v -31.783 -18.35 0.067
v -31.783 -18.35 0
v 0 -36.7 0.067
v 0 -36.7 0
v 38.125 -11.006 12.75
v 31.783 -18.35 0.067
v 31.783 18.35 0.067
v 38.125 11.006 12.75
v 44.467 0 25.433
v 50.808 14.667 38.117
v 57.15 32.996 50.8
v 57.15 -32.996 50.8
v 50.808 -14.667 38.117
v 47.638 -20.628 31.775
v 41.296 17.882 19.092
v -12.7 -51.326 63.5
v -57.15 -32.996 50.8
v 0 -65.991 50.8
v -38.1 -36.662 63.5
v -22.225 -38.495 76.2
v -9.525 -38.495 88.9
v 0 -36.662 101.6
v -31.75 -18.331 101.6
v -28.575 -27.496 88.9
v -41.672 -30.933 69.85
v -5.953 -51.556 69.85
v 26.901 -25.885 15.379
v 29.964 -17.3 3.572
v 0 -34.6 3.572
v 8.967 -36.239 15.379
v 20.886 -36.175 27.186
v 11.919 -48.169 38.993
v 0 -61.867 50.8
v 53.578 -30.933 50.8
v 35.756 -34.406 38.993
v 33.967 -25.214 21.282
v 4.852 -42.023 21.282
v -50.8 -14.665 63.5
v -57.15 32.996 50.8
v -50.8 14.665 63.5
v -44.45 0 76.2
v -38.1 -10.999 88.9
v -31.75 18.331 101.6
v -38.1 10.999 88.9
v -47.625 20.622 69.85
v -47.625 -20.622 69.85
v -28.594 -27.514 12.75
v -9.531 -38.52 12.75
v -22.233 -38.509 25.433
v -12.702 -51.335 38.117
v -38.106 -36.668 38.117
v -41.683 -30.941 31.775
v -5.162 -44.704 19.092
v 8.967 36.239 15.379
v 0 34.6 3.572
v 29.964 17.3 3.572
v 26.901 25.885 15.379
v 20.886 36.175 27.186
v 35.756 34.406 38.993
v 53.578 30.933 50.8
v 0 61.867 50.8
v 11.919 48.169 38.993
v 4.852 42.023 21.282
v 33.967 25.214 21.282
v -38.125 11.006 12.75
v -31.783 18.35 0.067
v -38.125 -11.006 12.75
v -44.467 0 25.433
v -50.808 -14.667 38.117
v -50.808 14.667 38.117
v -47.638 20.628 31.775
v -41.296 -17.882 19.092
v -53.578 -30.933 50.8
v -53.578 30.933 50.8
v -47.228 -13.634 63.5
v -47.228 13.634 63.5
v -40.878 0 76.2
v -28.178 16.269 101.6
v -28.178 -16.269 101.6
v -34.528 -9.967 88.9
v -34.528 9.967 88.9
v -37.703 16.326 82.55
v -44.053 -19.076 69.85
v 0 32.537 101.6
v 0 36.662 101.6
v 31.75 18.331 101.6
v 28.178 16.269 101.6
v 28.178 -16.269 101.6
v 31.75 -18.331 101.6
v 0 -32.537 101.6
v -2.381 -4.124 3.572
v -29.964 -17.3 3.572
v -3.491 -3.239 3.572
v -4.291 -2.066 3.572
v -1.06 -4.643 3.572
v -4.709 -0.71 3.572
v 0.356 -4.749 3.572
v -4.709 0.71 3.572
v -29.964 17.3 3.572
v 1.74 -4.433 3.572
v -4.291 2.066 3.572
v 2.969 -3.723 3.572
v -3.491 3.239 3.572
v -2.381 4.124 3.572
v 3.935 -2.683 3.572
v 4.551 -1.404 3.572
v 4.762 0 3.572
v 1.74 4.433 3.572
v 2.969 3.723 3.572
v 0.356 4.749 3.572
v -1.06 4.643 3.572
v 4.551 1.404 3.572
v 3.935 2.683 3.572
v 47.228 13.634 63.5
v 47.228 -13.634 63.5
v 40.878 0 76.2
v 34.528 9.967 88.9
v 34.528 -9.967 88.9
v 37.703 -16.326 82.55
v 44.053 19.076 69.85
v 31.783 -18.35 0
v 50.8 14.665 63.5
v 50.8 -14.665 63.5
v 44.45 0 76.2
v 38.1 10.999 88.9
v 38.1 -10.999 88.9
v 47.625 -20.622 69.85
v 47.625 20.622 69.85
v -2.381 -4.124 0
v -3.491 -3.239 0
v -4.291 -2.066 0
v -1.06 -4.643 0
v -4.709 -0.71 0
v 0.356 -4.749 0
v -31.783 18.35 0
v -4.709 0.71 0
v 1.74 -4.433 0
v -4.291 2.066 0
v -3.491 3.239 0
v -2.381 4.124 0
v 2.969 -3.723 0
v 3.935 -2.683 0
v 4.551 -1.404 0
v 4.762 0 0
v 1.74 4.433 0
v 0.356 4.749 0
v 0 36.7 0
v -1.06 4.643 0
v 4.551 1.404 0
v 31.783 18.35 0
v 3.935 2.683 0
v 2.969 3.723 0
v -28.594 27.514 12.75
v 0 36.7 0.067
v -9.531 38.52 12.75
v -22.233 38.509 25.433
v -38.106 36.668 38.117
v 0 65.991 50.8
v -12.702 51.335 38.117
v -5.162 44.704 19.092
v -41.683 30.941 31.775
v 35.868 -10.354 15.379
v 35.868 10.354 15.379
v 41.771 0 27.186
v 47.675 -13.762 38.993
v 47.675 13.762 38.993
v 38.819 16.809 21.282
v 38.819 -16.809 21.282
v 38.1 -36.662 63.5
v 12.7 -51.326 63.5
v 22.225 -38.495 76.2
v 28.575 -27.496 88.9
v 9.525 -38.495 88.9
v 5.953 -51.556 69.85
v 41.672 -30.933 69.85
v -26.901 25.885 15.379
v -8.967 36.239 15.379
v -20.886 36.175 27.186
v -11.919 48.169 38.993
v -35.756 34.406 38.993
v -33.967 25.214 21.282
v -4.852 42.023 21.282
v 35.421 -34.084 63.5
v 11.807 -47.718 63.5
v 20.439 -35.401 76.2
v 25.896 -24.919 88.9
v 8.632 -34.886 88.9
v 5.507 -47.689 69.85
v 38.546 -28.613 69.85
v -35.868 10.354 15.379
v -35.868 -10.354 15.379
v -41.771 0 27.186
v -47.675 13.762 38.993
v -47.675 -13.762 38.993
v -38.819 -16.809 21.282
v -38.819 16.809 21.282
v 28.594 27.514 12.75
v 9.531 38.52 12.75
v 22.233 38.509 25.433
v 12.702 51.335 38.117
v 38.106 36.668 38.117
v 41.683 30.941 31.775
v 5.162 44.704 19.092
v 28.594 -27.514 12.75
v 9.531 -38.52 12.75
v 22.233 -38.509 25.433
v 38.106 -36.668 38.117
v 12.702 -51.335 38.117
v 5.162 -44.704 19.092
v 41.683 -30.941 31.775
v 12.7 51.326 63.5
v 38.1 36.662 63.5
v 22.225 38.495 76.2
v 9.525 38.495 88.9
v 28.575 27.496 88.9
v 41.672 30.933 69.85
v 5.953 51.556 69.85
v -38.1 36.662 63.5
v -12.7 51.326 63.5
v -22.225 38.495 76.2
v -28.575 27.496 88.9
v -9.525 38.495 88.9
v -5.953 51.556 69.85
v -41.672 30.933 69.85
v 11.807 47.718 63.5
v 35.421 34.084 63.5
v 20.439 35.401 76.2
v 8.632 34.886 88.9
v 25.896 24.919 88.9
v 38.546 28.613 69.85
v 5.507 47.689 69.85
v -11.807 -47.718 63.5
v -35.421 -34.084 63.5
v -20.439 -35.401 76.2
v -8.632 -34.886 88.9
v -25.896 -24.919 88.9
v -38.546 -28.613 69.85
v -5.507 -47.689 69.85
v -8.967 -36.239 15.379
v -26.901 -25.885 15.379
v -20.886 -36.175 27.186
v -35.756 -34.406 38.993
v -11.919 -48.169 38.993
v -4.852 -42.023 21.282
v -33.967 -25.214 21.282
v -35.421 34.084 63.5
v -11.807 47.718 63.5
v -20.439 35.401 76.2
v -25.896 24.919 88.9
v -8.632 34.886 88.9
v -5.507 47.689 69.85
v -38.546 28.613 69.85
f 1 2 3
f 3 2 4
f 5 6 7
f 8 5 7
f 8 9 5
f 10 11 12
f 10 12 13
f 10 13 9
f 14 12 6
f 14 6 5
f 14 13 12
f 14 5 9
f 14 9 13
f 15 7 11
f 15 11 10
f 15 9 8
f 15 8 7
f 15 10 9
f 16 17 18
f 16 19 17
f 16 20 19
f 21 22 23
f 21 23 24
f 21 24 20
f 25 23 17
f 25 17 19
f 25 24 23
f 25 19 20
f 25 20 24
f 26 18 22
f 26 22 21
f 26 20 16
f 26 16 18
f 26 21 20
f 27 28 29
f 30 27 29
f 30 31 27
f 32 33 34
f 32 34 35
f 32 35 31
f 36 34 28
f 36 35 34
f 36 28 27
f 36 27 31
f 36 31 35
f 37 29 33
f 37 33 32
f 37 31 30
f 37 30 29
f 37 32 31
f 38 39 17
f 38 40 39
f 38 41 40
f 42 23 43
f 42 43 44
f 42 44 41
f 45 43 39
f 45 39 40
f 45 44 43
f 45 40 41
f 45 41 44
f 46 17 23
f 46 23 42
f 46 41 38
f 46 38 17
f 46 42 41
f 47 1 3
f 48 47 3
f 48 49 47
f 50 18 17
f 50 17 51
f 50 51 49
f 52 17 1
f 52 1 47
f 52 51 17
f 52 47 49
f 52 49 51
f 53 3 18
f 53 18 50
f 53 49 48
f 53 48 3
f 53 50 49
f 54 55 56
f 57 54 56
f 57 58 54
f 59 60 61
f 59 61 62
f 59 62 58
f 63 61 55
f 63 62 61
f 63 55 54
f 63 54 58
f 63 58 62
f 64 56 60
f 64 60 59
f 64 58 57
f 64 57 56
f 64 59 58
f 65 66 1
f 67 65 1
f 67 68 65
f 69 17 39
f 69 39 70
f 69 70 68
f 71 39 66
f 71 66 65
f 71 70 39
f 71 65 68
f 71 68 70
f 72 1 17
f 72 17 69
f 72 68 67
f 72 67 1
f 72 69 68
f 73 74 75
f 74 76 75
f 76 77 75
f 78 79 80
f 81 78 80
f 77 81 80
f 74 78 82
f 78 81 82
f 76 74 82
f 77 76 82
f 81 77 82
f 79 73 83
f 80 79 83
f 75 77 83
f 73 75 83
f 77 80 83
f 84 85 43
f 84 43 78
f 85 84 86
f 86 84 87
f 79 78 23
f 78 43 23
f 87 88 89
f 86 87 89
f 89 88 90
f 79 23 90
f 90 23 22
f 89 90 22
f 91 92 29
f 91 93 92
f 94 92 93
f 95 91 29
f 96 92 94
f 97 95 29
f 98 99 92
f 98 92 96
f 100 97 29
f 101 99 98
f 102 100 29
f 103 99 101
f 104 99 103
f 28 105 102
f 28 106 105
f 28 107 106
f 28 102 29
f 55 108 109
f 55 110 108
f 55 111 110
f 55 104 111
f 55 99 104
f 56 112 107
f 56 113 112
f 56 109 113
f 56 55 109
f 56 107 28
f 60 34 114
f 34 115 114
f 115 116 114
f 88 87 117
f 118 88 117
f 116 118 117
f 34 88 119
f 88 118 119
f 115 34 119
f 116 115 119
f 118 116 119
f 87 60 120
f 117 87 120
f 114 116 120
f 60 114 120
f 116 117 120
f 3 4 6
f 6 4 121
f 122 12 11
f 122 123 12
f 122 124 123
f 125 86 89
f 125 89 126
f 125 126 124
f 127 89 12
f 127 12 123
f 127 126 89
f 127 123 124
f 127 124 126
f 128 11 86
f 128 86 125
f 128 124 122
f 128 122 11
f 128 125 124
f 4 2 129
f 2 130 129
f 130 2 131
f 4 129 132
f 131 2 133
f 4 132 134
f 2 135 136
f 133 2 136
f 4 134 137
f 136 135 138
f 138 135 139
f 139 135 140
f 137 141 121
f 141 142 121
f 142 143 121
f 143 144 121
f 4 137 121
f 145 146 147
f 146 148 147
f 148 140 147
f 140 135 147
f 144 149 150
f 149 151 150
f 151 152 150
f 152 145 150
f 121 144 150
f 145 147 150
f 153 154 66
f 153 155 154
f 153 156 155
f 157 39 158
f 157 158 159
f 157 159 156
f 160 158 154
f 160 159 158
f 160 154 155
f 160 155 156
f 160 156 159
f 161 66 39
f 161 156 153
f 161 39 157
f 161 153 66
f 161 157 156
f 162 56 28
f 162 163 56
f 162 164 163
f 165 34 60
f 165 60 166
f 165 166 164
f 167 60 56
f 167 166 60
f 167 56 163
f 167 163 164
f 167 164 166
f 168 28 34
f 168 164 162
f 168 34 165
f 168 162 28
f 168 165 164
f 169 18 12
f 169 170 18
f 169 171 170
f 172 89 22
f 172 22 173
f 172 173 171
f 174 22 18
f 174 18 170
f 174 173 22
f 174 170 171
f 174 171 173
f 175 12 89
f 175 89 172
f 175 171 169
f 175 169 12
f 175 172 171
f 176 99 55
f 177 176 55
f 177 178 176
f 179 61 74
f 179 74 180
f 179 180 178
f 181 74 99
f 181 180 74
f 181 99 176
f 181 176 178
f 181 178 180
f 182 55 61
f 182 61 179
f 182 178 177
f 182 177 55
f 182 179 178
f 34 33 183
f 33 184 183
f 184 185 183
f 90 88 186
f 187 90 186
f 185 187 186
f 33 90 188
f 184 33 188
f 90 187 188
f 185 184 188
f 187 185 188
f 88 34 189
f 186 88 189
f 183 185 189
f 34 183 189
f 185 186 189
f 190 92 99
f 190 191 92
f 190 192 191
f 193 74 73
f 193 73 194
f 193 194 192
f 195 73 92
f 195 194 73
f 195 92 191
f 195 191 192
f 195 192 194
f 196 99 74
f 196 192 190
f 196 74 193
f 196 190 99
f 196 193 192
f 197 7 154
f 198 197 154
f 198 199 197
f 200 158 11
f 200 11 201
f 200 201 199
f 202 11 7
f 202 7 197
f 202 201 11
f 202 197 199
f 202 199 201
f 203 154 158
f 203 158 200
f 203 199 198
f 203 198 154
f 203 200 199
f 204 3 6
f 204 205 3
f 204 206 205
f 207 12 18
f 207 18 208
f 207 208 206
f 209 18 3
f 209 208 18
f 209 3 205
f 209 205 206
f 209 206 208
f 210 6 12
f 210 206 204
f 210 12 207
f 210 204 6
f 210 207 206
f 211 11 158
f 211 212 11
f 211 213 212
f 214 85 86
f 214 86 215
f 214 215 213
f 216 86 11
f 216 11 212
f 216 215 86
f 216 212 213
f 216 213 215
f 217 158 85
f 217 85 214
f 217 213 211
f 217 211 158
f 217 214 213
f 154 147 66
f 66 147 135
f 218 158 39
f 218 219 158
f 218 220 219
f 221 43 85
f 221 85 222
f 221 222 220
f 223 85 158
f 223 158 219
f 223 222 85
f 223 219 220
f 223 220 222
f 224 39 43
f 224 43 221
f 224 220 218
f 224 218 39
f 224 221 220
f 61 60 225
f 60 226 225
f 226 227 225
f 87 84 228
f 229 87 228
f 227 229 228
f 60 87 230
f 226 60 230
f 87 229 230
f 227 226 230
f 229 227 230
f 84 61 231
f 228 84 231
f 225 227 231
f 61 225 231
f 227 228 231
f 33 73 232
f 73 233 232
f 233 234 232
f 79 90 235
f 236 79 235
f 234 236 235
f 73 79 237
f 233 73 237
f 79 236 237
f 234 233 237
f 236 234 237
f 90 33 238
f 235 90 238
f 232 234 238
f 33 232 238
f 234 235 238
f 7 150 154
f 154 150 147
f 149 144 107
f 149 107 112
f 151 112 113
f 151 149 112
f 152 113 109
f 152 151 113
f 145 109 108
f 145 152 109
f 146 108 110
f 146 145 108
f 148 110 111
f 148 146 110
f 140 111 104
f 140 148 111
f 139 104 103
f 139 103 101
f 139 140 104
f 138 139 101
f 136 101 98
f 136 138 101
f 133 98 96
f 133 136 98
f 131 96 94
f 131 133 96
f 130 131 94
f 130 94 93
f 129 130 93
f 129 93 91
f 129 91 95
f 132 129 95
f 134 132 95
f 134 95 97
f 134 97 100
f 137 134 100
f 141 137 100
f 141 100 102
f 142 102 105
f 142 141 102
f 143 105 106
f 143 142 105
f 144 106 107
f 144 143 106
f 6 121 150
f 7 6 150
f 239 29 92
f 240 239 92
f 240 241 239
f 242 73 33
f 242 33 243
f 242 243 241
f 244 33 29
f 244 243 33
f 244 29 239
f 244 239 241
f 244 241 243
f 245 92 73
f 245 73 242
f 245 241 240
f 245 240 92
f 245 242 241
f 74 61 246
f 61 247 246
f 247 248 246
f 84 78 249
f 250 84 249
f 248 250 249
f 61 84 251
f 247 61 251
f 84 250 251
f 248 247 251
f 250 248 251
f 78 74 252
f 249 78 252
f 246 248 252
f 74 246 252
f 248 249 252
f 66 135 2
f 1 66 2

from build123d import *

# Parameters (mm, degrees)
F12_R     = 4.7625
F13_DEPTH = 3.571875


with BuildPart() as f5:
    # F0 (on Top) → F5 section 0
    with BuildSketch(Plane.XY):
        Polygon((-31.75, 18.3308710468), (-31.75, -18.3308710468), (0, -36.6617420935), (31.75, -18.3308710468), (31.75, 18.3308710468), (0, 36.6617420935), align=None)
    # F2 (on offset) → F5 section 1
    with BuildSketch(Plane.XY.offset(50.8)):
        Polygon((-57.15, 32.9955678842), (-57.15, -32.9955678842), (0, -65.9911357684), (57.15, -32.9955678842), (57.15, 32.9955678842), (0, 65.9911357684), align=None)
    loft()

    # F5_face (on face) → F6 section 0
    with BuildSketch(Plane.XY.offset(50.8)):
        Polygon((-57.15, 32.9955678842), (-57.15, -32.9955678842), (0, -65.9911357684), (57.15, -32.9955678842), (57.15, 32.9955678842), (0, 65.9911357684), align=None)
    # F4 (on offset) → F6 section 1
    with BuildSketch(Plane.XY.offset(101.6)):
        Polygon((-31.75, 18.3308710468), (-31.75, -18.3308710468), (0, -36.6617420935), (31.75, -18.3308710468), (31.75, 18.3308710468), (0, 36.6617420935), align=None)
    loft()

    # F7 (on face) → F9 section 0
    with BuildSketch(Plane(origin=(0, 0, 0), x_dir=(1, 0, 0), z_dir=(0, 0, -1))):
        Polygon((-28.178125, 16.268648054), (-28.178125, -16.268648054), (0, -32.537296108), (28.178125, -16.268648054), (28.178125, 16.268648054), (0, 32.537296108), align=None)
    # F8 (on offset) → F9 section 1
    with BuildSketch(Plane.XY.offset(50.8)):
        Polygon((-53.578125, 30.9333448914), (-53.578125, -30.9333448914), (0, -61.8666897829), (53.578125, -30.9333448914), (53.578125, 30.9333448914), (0, 61.8666897829), align=None)
    loft(mode=Mode.SUBTRACT)

    # F8 (on offset) → F11 section 0
    with BuildSketch(Plane.XY.offset(50.8)):
        Polygon((-53.578125, 30.9333448914), (-53.578125, -30.9333448914), (0, -61.8666897829), (53.578125, -30.9333448914), (53.578125, 30.9333448914), (0, 61.8666897829), align=None)
    # F10 (on face) → F11 section 1
    with BuildSketch(Plane.XY.offset(101.6)):
        Polygon((-28.178125, 16.268648054), (-28.178125, -16.268648054), (0, -32.537296108), (28.178125, -16.268648054), (28.178125, 16.268648054), (0, 32.537296108), align=None)
    loft(mode=Mode.SUBTRACT)

    # F12 (on Top) → F13 (join)
    with BuildSketch(Plane.XY):
        Polygon((-31.7834205925, 18.3501664349), (-31.7834205925, -18.3501664349), (0, -36.7003328697), (31.7834205925, -18.3501664349), (31.7834205925, 18.3501664349), (0, 36.7003328697), align=None)
        Circle(F12_R, mode=Mode.SUBTRACT)
    extrude(amount=F13_DEPTH)


solid = f5.part
